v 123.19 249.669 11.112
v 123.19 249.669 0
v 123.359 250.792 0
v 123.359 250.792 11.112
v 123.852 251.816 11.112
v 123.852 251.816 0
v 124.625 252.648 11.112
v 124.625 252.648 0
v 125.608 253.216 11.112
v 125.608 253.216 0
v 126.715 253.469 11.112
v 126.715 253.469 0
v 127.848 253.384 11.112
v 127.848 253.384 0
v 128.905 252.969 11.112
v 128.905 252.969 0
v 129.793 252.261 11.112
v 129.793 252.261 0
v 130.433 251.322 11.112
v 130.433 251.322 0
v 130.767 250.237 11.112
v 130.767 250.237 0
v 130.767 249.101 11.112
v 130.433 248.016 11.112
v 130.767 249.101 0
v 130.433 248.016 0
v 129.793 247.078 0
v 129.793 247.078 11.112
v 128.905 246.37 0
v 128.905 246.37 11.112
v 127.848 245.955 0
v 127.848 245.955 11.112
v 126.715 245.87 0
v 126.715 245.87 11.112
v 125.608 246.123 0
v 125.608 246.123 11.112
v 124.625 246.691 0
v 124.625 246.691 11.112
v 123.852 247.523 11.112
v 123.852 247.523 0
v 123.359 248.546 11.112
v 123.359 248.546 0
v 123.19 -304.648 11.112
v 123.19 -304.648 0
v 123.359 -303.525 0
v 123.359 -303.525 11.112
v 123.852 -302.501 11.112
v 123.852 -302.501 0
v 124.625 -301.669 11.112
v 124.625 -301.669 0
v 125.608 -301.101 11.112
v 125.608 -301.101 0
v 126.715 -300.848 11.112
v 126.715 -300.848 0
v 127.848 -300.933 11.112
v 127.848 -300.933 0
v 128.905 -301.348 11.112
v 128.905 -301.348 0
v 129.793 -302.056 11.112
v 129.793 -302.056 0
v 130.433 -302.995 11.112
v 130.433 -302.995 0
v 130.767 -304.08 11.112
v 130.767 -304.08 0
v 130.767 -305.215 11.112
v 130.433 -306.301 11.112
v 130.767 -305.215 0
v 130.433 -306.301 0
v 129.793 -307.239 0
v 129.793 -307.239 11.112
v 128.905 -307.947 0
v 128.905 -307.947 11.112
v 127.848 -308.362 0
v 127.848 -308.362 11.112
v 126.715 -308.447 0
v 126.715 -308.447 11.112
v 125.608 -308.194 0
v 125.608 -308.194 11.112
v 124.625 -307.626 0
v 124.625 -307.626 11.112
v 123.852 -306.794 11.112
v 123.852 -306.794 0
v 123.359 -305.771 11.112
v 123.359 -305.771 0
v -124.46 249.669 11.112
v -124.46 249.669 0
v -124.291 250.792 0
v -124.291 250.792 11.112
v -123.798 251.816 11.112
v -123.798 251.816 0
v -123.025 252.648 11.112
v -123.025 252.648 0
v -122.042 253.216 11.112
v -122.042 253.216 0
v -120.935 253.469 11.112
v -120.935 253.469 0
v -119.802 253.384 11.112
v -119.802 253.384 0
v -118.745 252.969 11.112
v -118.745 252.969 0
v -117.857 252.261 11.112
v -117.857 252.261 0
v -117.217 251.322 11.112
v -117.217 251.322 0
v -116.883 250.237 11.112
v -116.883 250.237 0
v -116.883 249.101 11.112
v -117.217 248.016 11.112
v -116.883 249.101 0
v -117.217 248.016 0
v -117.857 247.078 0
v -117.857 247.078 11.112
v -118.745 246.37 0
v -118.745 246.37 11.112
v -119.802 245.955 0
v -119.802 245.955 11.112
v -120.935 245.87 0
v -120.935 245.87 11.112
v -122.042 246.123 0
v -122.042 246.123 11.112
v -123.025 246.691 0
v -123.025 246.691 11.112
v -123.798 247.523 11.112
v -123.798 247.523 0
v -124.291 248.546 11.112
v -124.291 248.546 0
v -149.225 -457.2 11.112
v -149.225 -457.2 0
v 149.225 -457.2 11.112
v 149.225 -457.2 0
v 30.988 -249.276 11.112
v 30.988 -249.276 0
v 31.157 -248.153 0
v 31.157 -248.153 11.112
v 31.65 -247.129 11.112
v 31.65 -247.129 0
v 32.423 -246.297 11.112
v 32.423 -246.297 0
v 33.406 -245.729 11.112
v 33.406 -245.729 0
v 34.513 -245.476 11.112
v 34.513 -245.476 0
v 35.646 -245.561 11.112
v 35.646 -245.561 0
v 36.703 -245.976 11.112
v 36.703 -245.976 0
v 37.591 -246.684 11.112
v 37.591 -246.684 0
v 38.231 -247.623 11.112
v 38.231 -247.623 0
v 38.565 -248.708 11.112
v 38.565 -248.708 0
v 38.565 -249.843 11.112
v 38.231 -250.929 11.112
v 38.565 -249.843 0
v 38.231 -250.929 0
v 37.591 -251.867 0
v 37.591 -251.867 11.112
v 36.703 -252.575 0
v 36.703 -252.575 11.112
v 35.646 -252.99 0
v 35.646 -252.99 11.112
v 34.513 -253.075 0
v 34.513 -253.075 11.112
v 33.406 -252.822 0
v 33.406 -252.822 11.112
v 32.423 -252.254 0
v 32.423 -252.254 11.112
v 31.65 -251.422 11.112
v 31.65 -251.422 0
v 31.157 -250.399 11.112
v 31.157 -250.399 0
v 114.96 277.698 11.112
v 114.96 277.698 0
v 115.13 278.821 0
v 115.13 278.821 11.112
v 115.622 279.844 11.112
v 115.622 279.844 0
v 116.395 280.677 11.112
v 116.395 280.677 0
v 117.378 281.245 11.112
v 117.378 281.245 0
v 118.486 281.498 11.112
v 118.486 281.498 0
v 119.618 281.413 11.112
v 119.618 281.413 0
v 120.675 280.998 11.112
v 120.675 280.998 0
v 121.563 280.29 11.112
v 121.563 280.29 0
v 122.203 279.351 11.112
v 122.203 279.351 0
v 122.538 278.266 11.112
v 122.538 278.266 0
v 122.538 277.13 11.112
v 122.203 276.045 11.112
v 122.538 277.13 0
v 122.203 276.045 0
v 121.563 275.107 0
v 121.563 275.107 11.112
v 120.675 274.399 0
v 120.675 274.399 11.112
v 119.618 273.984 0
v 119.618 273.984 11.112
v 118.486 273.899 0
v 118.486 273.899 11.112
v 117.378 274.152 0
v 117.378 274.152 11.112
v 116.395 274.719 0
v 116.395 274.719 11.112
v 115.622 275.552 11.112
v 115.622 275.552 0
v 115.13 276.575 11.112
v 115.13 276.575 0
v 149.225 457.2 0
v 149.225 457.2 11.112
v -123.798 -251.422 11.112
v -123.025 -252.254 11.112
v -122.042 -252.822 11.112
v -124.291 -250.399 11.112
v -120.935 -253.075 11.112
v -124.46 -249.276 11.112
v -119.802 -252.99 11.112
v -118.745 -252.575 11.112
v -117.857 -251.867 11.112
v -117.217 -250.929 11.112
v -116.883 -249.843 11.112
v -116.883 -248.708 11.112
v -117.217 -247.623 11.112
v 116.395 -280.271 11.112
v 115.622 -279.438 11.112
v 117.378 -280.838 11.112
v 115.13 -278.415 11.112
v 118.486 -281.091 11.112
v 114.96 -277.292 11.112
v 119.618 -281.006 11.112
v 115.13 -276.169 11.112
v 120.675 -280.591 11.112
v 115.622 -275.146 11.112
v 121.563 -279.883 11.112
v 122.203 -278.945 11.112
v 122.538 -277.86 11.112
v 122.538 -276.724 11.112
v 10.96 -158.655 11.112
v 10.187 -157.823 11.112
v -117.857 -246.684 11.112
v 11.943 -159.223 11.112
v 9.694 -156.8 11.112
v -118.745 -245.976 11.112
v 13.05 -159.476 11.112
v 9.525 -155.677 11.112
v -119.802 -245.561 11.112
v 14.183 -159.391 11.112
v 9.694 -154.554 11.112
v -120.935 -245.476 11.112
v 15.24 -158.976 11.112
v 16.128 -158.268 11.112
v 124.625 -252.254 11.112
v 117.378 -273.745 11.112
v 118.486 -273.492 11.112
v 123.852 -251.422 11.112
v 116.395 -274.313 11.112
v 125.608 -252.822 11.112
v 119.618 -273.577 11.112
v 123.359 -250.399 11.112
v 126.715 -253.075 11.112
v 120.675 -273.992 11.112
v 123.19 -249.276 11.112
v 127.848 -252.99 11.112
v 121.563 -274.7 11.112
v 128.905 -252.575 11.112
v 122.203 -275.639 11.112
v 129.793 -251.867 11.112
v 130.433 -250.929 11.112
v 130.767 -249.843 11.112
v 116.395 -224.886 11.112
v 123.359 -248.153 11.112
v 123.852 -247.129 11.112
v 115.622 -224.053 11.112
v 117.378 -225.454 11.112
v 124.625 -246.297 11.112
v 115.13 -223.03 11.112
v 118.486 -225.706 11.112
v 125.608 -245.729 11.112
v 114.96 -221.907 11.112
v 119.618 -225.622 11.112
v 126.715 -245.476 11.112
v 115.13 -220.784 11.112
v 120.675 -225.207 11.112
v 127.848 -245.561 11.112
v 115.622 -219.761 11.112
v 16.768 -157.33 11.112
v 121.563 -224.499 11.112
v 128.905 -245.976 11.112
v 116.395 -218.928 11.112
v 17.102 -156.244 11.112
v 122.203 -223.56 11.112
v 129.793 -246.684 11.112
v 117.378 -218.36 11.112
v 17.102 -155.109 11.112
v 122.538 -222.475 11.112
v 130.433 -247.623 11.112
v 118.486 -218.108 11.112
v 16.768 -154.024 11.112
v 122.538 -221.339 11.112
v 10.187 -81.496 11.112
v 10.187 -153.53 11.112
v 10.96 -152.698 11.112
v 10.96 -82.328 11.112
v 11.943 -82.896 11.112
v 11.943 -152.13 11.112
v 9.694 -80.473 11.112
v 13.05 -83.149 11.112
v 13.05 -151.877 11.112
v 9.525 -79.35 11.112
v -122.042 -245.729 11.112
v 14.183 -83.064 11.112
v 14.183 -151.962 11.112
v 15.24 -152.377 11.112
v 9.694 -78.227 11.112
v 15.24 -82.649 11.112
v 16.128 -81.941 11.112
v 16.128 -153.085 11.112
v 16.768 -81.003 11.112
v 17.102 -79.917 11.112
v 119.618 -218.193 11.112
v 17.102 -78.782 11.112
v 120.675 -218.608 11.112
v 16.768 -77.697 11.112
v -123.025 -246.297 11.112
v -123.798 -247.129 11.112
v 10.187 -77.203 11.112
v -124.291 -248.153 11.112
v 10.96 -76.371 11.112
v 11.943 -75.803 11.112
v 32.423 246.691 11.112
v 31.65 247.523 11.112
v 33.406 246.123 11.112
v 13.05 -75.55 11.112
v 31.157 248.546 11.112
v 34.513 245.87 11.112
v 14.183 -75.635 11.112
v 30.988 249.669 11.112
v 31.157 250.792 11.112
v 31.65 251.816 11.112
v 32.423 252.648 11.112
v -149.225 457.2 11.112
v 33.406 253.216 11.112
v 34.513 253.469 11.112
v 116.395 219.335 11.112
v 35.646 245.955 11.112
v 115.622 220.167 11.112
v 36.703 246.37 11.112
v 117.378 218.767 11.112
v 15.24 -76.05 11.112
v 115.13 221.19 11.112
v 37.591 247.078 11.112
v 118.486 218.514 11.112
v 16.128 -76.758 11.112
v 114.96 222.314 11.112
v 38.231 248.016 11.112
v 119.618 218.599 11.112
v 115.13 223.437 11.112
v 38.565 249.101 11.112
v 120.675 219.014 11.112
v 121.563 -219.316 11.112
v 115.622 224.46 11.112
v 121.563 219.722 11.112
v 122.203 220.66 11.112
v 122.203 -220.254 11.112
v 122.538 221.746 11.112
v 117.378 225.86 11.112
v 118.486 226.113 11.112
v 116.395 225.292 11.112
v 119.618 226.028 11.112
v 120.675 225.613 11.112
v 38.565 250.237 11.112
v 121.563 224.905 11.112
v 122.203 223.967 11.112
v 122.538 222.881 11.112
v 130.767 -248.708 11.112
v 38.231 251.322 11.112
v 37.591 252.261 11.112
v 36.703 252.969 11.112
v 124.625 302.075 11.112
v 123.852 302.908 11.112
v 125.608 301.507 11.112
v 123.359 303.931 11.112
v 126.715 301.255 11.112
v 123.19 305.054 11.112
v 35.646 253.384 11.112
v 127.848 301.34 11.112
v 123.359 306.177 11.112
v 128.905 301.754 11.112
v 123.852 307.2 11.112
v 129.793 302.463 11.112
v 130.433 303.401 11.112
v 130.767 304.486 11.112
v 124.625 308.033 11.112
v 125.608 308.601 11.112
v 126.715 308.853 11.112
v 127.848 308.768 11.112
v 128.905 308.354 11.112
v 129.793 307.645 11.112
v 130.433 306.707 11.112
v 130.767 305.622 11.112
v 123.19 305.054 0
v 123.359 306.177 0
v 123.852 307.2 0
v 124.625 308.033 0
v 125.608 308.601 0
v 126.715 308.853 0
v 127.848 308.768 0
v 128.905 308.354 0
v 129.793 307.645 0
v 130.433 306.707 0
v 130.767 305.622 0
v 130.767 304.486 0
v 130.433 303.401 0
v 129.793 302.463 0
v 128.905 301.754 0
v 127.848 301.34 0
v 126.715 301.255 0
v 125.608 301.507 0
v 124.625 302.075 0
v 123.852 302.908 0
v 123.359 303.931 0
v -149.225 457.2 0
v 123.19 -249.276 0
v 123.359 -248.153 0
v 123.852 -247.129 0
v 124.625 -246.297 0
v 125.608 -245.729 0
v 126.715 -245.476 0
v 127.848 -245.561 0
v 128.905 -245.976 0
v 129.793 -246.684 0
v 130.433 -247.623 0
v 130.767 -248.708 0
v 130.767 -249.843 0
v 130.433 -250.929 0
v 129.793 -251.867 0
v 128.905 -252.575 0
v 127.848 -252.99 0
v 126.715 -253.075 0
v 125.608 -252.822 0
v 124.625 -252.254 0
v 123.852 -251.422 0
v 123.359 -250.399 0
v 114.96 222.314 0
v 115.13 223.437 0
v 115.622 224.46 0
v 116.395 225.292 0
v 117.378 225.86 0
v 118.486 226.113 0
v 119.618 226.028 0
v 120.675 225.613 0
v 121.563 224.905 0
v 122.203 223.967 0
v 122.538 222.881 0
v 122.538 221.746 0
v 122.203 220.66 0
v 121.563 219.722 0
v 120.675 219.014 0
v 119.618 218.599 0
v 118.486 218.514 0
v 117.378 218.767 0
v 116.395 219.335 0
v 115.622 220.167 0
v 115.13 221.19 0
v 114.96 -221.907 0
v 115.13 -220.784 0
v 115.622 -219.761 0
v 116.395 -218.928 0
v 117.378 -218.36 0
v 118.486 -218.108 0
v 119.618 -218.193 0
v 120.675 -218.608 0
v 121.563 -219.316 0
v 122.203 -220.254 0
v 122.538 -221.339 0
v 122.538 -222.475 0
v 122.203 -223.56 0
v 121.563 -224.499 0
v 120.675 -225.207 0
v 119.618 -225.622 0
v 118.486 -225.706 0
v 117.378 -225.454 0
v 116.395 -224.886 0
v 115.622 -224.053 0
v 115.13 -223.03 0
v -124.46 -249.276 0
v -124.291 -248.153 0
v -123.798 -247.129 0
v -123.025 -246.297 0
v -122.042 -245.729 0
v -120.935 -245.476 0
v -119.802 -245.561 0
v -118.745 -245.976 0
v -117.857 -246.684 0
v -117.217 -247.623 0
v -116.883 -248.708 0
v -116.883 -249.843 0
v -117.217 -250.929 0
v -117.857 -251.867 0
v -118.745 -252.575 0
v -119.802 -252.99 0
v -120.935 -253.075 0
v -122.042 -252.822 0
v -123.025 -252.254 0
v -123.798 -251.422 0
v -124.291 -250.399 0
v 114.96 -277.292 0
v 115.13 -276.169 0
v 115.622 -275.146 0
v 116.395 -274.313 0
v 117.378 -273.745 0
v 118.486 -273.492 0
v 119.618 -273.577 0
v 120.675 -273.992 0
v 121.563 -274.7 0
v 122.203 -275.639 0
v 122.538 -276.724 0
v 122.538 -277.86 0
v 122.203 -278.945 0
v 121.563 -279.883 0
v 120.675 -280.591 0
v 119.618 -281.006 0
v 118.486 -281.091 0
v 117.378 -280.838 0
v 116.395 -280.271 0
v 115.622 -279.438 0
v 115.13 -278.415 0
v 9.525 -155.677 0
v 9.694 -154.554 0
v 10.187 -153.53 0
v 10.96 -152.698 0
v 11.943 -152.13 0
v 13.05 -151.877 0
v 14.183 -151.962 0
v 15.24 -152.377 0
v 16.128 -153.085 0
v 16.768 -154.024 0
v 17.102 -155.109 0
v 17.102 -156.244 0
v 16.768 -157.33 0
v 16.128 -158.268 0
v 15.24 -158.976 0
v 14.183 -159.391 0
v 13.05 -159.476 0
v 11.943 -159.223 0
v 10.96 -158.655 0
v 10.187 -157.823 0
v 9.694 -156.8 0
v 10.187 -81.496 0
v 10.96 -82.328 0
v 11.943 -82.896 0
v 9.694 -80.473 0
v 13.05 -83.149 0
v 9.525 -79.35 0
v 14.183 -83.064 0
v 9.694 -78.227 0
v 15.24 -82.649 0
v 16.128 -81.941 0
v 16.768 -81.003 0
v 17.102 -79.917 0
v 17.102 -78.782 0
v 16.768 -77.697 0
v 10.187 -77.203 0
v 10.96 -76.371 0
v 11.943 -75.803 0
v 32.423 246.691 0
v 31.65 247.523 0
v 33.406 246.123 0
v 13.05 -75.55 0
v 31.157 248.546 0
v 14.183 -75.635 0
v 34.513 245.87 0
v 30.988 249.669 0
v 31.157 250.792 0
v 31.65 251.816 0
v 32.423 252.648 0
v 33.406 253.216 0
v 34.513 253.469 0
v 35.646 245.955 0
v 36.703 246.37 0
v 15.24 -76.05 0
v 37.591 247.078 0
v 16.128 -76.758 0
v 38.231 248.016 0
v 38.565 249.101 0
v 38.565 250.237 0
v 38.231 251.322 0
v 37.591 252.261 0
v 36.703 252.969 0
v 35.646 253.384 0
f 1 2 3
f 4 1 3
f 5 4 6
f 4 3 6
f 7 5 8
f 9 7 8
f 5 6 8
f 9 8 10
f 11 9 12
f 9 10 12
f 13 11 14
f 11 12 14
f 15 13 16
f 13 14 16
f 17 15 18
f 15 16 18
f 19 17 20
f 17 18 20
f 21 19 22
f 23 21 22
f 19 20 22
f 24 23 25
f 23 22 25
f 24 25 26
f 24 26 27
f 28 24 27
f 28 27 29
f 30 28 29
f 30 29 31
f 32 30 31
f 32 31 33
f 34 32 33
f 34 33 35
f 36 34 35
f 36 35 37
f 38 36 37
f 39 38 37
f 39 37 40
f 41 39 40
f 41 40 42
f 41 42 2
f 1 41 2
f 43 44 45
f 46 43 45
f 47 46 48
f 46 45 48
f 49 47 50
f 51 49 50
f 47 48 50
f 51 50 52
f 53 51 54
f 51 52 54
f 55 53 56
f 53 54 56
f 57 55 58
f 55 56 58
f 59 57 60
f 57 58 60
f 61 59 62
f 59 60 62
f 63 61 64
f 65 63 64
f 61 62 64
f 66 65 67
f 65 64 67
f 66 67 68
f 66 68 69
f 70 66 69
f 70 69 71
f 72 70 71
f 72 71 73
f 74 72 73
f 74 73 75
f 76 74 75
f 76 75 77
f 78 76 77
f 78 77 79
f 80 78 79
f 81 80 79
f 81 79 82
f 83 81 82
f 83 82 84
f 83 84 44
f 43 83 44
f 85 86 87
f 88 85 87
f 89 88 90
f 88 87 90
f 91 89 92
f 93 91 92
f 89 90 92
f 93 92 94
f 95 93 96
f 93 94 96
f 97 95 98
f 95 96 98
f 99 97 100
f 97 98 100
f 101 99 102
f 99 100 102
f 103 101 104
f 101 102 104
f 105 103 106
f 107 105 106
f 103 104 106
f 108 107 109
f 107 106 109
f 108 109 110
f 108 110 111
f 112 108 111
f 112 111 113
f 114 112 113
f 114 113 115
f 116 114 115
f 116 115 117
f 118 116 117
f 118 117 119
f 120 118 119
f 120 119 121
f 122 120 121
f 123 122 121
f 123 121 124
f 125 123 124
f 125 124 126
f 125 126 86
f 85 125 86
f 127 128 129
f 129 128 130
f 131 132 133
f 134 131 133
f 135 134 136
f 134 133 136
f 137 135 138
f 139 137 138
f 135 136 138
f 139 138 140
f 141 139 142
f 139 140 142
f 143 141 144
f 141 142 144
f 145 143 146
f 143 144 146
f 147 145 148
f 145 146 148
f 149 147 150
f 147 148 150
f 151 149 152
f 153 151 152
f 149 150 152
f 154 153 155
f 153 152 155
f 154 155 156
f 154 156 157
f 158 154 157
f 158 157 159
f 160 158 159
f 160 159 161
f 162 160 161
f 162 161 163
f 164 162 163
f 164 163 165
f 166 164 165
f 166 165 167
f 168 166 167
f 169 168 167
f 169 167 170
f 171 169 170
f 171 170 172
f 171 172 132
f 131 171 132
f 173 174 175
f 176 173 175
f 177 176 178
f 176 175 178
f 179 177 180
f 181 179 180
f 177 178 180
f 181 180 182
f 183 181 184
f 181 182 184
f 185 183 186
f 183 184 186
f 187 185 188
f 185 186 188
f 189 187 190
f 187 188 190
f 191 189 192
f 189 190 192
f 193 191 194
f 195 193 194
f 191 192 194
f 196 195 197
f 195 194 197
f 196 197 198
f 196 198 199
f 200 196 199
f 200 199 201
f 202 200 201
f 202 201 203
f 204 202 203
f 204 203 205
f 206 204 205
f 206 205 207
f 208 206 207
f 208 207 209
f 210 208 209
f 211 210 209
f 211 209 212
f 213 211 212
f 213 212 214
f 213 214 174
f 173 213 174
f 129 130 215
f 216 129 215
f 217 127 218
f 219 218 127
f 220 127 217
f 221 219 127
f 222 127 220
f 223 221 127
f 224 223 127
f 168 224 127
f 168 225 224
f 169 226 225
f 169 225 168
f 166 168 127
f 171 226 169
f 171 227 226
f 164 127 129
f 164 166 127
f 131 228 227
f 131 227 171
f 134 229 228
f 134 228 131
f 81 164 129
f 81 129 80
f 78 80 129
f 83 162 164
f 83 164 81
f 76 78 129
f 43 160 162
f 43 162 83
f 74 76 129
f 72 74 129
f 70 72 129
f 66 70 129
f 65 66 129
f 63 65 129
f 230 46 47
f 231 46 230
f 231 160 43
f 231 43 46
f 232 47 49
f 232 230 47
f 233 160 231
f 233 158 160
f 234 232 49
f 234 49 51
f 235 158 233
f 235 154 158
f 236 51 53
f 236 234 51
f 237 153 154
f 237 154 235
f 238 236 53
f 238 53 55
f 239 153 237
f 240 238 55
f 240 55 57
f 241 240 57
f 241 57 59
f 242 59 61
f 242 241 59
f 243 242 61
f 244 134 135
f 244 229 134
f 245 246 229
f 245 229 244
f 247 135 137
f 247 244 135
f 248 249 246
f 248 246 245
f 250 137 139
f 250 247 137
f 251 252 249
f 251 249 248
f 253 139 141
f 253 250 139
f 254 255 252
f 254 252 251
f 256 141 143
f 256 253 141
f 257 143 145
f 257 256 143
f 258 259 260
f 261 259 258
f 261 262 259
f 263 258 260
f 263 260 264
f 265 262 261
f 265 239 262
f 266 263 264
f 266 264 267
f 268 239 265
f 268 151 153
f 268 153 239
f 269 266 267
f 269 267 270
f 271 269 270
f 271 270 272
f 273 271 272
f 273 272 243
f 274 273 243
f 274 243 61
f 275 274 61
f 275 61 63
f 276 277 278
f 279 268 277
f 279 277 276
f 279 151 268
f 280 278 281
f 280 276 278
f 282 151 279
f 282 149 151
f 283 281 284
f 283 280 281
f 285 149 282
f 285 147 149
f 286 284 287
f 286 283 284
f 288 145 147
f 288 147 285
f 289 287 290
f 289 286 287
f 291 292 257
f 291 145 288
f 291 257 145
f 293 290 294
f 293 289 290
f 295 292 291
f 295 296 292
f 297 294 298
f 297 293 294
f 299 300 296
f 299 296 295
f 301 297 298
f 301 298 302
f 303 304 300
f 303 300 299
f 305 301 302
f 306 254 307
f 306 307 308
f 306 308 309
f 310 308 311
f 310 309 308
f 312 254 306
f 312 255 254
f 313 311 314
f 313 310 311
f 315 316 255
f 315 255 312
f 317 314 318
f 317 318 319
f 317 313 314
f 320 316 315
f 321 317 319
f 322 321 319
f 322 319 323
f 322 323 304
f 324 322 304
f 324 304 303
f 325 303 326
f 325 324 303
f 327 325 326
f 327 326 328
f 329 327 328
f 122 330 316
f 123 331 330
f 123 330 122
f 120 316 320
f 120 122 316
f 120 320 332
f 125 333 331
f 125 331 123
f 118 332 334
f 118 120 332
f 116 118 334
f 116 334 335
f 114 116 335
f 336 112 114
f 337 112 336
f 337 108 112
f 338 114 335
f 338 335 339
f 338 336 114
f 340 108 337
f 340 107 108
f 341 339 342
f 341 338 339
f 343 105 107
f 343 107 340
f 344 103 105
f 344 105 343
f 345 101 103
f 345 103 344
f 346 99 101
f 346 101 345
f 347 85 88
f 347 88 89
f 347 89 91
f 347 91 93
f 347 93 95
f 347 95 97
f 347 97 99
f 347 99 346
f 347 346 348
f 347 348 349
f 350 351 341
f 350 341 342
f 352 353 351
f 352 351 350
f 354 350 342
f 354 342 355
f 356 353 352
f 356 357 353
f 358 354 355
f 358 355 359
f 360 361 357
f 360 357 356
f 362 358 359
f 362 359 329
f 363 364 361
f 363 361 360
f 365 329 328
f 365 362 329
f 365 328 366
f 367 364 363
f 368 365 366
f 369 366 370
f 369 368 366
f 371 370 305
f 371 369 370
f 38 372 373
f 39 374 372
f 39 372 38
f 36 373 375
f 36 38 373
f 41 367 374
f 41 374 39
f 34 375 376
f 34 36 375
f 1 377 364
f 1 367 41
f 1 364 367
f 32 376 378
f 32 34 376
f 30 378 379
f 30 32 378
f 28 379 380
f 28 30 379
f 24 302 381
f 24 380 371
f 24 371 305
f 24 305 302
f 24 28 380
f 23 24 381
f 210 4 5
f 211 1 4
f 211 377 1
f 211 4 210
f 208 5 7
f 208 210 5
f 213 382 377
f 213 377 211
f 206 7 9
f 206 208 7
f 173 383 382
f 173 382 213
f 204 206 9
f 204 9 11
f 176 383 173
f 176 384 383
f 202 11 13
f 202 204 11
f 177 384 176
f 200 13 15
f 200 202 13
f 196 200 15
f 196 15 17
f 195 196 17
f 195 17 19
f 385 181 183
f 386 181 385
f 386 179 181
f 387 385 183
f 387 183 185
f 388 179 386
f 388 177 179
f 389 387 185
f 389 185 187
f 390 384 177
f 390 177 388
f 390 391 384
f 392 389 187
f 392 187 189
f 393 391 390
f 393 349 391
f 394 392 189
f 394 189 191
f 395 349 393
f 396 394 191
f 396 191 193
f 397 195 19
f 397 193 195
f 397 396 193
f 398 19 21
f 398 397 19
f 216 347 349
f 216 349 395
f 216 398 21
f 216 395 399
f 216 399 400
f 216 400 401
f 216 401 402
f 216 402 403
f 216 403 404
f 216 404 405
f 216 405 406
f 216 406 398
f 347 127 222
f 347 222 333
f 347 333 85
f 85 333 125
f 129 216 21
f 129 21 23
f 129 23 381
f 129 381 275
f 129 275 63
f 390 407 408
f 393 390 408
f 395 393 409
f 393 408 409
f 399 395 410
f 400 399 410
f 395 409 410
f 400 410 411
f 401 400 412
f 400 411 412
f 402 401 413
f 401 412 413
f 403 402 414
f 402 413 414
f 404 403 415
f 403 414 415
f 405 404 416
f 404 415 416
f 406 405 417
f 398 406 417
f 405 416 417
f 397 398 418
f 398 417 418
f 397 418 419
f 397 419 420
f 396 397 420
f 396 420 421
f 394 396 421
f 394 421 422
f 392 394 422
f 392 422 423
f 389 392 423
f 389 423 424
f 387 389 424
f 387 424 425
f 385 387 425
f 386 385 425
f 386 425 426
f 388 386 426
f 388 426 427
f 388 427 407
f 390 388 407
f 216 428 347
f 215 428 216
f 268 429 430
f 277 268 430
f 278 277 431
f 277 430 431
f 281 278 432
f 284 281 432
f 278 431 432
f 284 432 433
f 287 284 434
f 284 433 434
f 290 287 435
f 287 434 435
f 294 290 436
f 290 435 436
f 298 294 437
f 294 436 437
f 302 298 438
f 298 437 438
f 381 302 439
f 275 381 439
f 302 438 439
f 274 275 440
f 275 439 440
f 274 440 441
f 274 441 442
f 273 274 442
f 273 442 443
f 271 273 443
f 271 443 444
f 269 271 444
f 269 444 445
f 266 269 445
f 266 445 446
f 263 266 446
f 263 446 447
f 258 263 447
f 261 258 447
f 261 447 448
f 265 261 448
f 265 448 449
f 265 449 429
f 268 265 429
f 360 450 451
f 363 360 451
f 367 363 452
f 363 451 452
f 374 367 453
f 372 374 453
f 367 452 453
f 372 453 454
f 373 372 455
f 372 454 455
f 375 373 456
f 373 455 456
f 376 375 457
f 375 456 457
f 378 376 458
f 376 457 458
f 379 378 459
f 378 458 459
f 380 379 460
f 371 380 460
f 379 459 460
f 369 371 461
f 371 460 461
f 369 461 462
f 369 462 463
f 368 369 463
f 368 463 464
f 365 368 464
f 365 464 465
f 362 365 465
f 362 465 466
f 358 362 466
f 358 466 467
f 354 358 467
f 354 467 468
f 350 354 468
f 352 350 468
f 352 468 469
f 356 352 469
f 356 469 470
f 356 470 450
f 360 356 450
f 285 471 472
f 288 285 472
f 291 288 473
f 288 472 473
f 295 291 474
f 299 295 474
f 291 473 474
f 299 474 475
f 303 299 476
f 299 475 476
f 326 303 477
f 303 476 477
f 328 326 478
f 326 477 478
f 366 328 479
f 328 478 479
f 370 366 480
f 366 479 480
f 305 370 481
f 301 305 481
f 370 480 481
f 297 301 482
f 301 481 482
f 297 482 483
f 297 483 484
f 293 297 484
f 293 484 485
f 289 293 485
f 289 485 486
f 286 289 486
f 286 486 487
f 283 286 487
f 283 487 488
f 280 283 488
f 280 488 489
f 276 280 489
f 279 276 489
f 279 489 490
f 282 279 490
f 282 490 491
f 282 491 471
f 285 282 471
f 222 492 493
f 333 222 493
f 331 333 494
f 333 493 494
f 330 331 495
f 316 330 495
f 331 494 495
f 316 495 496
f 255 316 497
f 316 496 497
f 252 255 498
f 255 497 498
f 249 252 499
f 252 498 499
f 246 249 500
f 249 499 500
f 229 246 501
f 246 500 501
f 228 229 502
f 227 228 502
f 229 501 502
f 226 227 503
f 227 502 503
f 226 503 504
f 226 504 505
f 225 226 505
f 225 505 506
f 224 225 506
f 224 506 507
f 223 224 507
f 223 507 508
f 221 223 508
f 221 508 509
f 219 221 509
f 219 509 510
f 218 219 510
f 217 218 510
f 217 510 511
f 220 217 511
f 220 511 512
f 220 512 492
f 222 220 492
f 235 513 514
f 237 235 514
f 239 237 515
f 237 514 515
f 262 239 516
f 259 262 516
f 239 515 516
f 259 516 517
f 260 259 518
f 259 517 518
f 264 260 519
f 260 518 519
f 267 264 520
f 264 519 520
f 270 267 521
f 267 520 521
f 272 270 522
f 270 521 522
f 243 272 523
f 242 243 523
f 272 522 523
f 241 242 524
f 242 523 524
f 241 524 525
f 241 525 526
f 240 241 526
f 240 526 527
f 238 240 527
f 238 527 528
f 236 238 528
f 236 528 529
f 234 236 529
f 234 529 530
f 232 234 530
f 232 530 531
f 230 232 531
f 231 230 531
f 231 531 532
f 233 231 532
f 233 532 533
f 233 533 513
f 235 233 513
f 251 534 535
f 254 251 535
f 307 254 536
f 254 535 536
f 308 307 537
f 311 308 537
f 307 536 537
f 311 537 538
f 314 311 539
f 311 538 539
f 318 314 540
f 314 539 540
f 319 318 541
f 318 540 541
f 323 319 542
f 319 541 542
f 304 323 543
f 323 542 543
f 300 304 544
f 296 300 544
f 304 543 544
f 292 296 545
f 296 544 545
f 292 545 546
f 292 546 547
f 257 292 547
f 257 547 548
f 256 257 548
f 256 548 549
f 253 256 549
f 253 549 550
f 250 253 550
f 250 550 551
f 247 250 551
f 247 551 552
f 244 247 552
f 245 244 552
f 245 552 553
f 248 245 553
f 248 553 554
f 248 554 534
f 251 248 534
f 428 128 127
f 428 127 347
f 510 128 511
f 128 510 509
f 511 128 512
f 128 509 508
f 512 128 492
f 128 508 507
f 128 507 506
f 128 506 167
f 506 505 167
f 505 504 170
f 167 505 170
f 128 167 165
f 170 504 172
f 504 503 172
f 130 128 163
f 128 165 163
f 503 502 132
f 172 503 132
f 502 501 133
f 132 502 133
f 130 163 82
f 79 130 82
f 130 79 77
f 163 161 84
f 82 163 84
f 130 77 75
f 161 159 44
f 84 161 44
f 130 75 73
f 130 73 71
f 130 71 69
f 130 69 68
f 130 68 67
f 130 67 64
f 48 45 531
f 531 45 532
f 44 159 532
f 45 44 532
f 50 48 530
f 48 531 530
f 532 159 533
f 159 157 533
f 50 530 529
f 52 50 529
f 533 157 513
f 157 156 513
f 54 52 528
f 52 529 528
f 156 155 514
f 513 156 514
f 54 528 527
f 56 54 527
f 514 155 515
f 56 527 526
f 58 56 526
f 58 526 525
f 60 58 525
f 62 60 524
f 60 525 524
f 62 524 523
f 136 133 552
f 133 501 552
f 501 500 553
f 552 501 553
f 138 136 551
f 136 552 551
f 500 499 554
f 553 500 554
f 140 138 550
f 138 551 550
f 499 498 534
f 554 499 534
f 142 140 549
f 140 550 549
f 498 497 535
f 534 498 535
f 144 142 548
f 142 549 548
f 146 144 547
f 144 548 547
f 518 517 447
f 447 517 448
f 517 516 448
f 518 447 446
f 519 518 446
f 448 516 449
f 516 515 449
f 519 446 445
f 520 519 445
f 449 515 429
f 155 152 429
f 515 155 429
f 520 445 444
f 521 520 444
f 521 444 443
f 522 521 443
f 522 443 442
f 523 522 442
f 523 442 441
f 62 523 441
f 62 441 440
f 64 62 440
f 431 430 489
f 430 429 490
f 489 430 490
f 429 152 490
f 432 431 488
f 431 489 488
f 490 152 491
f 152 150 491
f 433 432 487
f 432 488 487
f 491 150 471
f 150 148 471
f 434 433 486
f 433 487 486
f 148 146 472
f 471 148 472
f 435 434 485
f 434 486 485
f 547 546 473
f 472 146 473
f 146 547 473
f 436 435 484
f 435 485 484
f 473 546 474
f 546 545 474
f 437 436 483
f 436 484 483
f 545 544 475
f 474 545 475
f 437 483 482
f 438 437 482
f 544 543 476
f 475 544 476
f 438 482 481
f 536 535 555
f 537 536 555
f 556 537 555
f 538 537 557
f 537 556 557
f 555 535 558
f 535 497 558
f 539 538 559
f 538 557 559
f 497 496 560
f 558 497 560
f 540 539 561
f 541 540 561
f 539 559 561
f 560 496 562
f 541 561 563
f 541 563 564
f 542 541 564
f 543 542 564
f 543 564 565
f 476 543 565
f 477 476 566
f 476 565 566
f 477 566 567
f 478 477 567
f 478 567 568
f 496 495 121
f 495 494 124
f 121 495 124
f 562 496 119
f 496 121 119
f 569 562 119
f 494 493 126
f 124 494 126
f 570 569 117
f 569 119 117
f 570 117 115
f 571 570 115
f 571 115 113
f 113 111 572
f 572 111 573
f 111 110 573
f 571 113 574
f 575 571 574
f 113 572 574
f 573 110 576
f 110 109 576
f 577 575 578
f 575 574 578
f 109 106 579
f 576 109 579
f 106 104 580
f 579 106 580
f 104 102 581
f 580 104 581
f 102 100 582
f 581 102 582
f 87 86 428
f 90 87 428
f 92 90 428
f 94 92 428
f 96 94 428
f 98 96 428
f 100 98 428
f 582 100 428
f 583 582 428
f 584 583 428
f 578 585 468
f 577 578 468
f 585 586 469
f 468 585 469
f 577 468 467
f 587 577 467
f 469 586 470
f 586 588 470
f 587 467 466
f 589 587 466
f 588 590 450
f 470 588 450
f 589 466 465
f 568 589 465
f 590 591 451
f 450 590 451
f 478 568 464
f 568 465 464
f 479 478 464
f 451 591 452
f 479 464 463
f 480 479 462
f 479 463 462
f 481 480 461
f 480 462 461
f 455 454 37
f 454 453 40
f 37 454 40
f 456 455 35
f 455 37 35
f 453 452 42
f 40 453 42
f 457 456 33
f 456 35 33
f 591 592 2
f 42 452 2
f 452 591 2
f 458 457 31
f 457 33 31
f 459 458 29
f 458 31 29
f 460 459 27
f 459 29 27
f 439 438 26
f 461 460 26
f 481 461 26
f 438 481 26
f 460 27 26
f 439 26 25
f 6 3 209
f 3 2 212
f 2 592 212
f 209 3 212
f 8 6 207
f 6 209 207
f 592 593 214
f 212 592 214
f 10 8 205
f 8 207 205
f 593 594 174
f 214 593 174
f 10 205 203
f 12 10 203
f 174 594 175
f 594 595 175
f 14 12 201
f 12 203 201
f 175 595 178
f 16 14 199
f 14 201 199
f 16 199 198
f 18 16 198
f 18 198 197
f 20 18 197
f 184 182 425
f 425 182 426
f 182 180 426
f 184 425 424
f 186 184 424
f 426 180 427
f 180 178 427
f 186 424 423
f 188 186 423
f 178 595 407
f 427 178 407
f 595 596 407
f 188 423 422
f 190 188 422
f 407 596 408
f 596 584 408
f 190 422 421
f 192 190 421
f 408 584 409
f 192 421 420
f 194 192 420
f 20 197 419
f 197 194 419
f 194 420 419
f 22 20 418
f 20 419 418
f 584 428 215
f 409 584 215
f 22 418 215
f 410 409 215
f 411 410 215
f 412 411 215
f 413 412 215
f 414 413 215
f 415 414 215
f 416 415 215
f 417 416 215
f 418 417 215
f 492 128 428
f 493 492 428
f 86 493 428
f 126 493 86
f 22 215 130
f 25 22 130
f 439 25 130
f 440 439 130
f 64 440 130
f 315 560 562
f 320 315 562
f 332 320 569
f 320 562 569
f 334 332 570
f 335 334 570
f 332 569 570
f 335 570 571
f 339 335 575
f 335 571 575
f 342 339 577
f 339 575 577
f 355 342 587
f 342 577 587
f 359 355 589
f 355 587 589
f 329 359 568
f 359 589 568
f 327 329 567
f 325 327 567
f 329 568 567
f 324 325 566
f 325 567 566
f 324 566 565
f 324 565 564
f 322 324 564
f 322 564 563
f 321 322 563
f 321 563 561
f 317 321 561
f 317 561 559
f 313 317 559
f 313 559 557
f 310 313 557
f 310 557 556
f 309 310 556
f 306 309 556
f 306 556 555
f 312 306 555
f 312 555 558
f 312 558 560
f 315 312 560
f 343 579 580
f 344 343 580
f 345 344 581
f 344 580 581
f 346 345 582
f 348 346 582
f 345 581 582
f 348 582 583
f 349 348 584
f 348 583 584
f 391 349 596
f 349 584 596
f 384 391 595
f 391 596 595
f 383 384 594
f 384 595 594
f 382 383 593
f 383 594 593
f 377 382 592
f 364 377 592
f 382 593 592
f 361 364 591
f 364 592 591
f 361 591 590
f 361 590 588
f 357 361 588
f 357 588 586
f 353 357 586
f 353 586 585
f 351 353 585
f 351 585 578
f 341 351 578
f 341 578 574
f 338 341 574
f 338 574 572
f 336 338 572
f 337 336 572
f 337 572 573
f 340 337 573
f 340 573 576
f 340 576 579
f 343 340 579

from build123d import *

# Parameters (mm, degrees)
F0_W     = 298.45
F0_H     = 914.4
F1_DEPTH = 11.1125
F3_D     = 7.62
F3_DEPTH = 12.7


with BuildPart() as f1:
    # F0 (on Top) → F1 (new body)
    with BuildSketch(Plane.XY):
        Rectangle(F0_W, F0_H)
    extrude(amount=F1_DEPTH)

    # F3
    with Locations(Plane.XY.offset(11.1125)):
        with Locations((127, -304.6476), (118.7704, -277.2918), (127, -249.2756), (118.7704, -221.9071), (118.7704, 222.3135), (127, 249.6693), (118.7704, 277.6982), (127, 305.054), (34.798, 249.6693), (-120.65, 249.6693), (34.798, -249.2756), (-120.65, -249.2756), (13.335, -155.6766), (13.335, -79.3496)):
            Hole(F3_D / 2, depth=F3_DEPTH)


solid = f1.part
